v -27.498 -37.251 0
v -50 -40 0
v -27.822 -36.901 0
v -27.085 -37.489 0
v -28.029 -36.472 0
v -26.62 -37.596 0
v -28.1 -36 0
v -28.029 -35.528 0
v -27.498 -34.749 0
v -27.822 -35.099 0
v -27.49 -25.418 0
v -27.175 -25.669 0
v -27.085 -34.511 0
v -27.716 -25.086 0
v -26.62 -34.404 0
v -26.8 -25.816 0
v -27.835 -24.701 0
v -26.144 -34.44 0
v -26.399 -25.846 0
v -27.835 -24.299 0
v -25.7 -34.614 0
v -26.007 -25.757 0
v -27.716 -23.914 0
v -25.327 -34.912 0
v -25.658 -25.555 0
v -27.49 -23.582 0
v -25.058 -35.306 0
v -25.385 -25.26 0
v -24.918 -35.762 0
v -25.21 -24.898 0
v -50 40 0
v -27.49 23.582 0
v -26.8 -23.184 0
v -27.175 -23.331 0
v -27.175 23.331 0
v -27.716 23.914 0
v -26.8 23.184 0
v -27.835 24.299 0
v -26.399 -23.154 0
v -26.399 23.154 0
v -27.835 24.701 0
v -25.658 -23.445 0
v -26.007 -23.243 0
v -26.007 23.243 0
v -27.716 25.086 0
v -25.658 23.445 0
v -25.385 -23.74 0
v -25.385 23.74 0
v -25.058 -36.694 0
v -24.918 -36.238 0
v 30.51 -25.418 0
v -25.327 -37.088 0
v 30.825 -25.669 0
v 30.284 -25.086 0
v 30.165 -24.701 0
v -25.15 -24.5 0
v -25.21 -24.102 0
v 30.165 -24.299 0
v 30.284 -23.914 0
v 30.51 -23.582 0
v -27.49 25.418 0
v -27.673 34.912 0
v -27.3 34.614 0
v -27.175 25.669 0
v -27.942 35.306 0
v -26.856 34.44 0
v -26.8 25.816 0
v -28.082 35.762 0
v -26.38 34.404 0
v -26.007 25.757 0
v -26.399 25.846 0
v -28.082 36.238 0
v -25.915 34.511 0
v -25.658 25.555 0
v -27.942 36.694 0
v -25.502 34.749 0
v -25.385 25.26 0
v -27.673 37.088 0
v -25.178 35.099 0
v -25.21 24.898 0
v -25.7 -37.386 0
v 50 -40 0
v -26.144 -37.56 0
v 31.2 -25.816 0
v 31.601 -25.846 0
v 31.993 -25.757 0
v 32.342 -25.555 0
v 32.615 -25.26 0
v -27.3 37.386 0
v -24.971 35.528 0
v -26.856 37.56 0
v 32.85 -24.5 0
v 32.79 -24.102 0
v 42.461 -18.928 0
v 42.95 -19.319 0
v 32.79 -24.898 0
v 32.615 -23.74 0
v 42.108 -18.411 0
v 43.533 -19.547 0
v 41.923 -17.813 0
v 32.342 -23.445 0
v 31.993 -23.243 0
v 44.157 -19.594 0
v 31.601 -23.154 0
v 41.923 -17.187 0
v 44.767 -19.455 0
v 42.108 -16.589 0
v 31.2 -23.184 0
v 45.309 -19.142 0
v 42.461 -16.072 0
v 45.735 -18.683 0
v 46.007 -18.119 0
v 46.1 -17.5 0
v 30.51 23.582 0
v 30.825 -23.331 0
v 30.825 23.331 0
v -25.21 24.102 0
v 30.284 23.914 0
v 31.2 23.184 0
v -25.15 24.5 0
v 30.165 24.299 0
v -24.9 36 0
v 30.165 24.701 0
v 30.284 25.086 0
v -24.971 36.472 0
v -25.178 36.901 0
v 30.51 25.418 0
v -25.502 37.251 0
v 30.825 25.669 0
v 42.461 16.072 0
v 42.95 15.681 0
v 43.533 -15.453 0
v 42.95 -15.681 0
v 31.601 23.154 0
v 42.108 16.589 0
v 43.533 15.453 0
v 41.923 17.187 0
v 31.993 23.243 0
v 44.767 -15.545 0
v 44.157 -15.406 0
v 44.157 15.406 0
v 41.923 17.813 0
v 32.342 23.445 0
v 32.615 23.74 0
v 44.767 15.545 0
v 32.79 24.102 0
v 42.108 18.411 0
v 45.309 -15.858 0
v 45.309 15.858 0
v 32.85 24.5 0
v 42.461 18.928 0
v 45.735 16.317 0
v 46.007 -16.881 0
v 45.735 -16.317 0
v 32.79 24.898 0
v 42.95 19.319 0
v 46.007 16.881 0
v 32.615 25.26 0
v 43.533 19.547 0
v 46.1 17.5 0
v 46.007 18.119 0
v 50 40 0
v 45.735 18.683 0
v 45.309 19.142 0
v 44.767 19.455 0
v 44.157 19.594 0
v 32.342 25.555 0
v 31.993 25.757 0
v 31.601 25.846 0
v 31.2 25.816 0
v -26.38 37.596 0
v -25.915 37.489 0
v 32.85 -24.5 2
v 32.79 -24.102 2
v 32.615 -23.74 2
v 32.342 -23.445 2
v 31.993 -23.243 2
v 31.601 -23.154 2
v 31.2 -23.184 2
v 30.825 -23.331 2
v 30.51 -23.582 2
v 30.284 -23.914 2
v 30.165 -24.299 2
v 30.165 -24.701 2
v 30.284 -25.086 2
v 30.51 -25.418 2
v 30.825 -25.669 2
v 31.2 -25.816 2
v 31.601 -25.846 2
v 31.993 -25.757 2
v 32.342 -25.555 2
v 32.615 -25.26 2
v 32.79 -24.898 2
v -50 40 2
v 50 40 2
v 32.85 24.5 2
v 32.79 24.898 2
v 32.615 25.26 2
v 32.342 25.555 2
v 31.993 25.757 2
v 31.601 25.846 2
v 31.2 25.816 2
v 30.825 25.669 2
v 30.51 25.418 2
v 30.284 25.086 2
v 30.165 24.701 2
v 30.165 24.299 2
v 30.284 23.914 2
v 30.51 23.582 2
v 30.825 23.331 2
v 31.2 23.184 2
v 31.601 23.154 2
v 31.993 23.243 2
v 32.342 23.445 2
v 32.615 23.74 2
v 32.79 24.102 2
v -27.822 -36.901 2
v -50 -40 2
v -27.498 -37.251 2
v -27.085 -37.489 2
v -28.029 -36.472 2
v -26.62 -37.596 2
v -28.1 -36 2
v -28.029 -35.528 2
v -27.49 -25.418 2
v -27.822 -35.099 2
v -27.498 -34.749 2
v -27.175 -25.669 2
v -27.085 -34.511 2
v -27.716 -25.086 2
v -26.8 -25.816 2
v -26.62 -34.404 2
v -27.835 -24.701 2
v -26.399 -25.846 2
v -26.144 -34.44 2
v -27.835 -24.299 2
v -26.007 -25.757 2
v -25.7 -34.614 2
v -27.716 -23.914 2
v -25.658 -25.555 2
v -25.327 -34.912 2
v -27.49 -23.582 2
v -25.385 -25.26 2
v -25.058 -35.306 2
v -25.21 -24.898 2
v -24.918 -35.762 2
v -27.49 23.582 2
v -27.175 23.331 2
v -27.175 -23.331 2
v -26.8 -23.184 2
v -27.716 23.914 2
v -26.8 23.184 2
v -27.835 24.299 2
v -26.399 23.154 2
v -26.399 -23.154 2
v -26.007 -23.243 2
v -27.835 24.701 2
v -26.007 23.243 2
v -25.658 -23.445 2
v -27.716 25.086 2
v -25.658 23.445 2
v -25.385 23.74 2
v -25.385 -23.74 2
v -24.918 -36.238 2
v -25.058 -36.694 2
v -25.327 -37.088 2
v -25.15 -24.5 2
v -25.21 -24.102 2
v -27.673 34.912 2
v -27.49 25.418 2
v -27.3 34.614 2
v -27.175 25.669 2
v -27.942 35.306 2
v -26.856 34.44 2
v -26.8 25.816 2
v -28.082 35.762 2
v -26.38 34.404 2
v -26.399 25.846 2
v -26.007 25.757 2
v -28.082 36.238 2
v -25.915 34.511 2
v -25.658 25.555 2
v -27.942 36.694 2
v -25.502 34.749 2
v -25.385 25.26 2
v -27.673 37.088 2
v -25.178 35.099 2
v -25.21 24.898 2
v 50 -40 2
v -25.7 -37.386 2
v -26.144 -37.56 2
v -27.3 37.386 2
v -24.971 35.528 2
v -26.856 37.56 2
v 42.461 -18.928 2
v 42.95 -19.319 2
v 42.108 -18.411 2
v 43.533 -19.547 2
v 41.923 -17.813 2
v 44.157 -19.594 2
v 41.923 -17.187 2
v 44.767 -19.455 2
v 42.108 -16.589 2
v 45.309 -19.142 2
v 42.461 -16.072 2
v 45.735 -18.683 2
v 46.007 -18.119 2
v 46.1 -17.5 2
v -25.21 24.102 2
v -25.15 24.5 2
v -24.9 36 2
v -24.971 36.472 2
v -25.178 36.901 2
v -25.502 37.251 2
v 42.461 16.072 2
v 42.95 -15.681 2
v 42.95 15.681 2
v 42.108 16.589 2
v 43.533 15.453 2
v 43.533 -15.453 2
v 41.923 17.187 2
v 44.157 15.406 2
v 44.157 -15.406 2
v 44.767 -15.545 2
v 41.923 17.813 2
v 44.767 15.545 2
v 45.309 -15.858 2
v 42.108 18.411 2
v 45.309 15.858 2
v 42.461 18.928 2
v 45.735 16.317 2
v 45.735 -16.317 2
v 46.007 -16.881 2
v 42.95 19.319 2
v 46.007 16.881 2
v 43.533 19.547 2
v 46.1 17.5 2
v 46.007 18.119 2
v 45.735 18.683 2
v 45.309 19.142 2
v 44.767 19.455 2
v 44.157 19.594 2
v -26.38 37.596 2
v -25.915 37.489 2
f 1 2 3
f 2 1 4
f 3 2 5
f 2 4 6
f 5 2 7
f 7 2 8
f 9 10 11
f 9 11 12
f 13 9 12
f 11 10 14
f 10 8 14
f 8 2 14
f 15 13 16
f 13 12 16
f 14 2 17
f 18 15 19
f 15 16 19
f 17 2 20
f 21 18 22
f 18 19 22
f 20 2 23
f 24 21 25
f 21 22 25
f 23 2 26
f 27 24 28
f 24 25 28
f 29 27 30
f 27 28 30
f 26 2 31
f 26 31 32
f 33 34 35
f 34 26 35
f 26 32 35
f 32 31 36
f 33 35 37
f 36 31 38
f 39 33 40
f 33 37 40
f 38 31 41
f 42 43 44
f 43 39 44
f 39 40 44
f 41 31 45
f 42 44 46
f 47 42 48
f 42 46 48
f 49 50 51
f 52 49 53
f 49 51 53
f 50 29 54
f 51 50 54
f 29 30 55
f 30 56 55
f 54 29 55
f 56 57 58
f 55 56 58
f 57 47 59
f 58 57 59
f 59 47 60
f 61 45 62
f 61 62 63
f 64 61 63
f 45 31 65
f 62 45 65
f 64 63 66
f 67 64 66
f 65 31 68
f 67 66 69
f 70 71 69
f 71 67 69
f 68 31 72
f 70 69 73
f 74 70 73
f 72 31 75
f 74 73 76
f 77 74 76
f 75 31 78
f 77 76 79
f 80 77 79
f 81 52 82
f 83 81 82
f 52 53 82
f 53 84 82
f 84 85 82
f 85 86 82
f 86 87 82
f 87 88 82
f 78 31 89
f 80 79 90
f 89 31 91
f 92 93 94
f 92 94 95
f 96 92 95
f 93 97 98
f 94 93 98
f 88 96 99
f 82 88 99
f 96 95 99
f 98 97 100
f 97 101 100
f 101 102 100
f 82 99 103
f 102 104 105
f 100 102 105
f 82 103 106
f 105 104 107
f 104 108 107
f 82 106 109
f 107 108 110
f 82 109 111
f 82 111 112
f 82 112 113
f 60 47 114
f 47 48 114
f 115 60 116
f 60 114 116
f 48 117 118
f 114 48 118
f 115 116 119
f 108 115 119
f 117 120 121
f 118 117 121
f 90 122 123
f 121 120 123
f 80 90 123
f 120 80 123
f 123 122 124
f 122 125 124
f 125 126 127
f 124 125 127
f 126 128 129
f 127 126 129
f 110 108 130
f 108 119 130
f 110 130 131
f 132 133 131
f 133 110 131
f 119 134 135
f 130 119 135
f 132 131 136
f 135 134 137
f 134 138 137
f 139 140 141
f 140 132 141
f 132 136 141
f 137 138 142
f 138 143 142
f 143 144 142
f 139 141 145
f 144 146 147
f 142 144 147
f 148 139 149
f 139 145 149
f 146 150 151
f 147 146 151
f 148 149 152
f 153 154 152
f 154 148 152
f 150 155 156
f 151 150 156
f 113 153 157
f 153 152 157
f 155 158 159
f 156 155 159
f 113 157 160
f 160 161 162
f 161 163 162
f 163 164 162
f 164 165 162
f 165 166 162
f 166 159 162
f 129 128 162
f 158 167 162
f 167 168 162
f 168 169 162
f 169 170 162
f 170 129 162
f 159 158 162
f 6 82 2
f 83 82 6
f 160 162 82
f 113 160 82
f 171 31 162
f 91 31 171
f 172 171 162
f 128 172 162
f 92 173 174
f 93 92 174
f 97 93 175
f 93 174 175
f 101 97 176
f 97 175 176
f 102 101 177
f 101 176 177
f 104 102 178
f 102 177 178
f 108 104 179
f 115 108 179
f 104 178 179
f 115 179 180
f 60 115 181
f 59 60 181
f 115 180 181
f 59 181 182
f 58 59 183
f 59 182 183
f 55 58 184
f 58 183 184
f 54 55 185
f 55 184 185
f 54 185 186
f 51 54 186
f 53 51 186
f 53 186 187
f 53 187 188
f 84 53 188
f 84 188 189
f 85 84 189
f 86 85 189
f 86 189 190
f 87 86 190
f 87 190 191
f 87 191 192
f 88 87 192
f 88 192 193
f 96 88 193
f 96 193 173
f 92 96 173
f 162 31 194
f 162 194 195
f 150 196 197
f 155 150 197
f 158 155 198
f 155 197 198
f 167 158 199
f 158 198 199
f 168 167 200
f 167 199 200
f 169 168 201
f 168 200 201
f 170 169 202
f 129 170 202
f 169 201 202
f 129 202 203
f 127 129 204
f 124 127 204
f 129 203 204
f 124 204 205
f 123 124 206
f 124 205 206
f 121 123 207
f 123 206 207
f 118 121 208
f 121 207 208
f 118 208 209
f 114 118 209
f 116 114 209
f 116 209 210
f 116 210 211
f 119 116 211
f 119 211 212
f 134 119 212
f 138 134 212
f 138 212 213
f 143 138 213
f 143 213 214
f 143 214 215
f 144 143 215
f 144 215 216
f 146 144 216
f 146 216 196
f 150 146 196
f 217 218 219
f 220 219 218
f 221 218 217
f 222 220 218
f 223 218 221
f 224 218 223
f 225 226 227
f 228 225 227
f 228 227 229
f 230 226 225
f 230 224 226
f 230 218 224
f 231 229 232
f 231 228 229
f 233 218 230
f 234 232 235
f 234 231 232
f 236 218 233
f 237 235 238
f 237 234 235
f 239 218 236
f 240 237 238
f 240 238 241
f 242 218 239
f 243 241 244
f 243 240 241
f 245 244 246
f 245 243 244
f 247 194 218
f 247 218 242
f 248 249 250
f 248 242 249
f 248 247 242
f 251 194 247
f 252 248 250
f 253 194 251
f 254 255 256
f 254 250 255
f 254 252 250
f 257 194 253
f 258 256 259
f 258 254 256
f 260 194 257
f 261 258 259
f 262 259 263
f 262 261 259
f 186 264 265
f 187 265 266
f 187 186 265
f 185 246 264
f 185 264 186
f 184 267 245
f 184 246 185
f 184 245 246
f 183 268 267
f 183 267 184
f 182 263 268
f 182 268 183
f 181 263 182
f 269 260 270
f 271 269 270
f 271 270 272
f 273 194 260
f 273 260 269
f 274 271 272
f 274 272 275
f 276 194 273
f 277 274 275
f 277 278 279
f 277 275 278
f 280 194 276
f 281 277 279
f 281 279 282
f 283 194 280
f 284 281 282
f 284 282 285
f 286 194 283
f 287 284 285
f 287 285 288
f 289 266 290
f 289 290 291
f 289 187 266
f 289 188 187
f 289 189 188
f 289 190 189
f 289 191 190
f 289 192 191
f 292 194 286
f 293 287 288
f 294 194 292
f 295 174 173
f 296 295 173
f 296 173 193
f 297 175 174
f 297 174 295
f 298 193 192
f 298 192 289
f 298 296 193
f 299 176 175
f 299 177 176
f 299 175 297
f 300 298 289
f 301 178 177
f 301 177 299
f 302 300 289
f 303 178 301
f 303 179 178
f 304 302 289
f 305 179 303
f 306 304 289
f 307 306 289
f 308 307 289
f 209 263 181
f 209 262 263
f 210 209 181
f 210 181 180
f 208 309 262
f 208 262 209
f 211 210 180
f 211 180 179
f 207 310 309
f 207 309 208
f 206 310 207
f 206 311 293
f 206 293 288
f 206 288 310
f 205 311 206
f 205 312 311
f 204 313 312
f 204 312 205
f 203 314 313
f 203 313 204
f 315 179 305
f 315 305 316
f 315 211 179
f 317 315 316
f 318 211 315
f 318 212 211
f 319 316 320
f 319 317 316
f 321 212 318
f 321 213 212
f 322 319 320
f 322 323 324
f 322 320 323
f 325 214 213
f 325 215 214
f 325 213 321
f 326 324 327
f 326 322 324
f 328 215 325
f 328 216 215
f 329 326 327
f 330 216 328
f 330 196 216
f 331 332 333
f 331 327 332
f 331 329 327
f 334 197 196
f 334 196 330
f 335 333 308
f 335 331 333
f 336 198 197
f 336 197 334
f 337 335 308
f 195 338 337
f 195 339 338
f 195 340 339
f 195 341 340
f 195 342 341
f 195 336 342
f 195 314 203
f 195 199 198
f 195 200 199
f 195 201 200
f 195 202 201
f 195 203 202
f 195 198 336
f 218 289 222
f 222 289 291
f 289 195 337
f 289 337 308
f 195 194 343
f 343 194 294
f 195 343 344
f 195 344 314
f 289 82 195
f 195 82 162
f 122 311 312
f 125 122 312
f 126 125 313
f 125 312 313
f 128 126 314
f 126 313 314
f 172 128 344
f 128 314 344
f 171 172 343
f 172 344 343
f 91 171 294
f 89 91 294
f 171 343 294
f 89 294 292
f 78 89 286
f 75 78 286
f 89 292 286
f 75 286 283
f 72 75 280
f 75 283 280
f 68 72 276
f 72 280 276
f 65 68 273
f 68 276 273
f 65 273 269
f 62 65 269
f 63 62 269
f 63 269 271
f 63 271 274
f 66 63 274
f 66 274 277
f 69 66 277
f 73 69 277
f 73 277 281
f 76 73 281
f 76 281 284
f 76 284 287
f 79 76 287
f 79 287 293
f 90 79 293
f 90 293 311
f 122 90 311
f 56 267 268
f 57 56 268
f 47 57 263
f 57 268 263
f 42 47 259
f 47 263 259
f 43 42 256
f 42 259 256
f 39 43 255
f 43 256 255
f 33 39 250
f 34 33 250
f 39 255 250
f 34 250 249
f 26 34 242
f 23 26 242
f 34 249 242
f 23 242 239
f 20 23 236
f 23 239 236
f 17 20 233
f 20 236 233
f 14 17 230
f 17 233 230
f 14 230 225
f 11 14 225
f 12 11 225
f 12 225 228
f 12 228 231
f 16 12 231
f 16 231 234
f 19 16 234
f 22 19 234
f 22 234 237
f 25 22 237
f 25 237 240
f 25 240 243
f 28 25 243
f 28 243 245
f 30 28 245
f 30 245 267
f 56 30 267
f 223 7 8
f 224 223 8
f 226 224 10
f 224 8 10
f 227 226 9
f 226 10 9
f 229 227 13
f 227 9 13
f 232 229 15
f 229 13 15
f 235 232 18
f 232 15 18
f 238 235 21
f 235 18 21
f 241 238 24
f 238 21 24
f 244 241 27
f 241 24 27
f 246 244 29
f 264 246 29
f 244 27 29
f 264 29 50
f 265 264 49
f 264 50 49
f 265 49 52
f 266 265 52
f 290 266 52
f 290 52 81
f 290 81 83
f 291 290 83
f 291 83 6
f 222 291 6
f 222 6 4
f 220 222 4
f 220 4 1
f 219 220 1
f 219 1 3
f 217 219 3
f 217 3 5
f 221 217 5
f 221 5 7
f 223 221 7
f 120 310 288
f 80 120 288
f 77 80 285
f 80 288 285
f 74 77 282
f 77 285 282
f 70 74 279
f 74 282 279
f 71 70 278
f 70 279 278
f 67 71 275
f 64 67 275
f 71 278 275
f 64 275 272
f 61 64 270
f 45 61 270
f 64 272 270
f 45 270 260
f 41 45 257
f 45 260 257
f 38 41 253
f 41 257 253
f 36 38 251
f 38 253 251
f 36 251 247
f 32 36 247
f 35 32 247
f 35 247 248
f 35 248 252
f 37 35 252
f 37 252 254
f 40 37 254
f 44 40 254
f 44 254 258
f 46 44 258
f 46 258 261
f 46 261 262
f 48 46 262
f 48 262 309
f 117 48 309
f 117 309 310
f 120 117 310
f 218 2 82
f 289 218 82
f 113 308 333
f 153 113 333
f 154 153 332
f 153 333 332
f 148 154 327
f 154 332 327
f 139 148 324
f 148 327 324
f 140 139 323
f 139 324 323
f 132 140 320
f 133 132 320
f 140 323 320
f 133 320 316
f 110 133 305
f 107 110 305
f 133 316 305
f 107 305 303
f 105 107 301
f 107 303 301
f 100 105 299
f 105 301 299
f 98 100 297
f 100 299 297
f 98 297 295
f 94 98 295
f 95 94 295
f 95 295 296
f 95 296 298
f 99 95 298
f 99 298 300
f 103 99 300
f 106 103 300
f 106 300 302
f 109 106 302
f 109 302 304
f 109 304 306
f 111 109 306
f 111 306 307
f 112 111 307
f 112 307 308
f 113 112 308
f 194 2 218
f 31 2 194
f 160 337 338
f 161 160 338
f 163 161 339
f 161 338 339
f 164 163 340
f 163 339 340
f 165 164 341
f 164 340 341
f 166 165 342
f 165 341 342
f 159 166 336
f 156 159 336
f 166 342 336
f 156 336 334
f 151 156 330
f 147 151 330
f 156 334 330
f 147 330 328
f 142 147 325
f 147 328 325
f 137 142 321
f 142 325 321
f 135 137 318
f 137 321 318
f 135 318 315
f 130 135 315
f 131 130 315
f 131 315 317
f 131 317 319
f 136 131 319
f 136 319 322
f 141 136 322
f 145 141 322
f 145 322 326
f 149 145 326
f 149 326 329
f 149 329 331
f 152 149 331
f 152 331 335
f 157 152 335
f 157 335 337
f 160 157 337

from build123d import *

# Parameters (mm, degrees)
SKETCH_1_W          = 100
SKETCH_1_H          = 80
EXTRUDE_1_DEPTH     = 2
SKETCH_3_R          = 1.35
CUT_EXTRUDE_1_DEPTH = 3
SKETCH_4_R          = 1.6
CUT_EXTRUDE_2_DEPTH = 3
SKETCH_5_R          = 1.6
CUT_EXTRUDE_3_DEPTH = 3
SKETCH_7_R          = 2.1
CUT_EXTRUDE_5_DEPTH = 10


with BuildPart() as part:
    # 草图1 → 凸台-拉伸1 (new body)
    with BuildSketch(Plane.XY):
        Rectangle(SKETCH_1_W, SKETCH_1_H)
    extrude(amount=EXTRUDE_1_DEPTH)

    # 草图3 → 切除-拉伸1 (cut, through all)
    with BuildSketch(Plane.XY.offset(2)):
        with Locations((-26.5, -24.5)):
            Circle(SKETCH_3_R)
        with Locations((-26.5, 24.5)):
            Circle(SKETCH_3_R)
        with Locations((31.5, 24.5)):
            Circle(SKETCH_3_R)
        with Locations((31.5, -24.5)):
            Circle(SKETCH_3_R)
    extrude(amount=-CUT_EXTRUDE_1_DEPTH, mode=Mode.SUBTRACT)

    # 草图4 → 切除-拉伸2 (cut, through all)
    with BuildSketch(Plane(origin=(0, 0, 0), x_dir=(-1, 0, 0), z_dir=(0, 0, -1))):
        with Locations((26.5, -36)):
            Circle(SKETCH_4_R)
    extrude(amount=-CUT_EXTRUDE_2_DEPTH, mode=Mode.SUBTRACT)

    # 草图5 → 切除-拉伸3 (cut, through all)
    with BuildSketch(Plane.XY.offset(2)):
        with Locations((-26.5, 36)):
            Circle(SKETCH_5_R)
    extrude(amount=-CUT_EXTRUDE_3_DEPTH, mode=Mode.SUBTRACT)

    # 草图7 → 切除-拉伸5 (cut)
    with BuildSketch(Plane.XY.offset(2)):
        with Locations((44, 17.5)):
            Circle(SKETCH_7_R)
        with Locations((44, -17.5)):
            Circle(SKETCH_7_R)
    extrude(amount=-CUT_EXTRUDE_5_DEPTH, mode=Mode.SUBTRACT)


solid = part.part
